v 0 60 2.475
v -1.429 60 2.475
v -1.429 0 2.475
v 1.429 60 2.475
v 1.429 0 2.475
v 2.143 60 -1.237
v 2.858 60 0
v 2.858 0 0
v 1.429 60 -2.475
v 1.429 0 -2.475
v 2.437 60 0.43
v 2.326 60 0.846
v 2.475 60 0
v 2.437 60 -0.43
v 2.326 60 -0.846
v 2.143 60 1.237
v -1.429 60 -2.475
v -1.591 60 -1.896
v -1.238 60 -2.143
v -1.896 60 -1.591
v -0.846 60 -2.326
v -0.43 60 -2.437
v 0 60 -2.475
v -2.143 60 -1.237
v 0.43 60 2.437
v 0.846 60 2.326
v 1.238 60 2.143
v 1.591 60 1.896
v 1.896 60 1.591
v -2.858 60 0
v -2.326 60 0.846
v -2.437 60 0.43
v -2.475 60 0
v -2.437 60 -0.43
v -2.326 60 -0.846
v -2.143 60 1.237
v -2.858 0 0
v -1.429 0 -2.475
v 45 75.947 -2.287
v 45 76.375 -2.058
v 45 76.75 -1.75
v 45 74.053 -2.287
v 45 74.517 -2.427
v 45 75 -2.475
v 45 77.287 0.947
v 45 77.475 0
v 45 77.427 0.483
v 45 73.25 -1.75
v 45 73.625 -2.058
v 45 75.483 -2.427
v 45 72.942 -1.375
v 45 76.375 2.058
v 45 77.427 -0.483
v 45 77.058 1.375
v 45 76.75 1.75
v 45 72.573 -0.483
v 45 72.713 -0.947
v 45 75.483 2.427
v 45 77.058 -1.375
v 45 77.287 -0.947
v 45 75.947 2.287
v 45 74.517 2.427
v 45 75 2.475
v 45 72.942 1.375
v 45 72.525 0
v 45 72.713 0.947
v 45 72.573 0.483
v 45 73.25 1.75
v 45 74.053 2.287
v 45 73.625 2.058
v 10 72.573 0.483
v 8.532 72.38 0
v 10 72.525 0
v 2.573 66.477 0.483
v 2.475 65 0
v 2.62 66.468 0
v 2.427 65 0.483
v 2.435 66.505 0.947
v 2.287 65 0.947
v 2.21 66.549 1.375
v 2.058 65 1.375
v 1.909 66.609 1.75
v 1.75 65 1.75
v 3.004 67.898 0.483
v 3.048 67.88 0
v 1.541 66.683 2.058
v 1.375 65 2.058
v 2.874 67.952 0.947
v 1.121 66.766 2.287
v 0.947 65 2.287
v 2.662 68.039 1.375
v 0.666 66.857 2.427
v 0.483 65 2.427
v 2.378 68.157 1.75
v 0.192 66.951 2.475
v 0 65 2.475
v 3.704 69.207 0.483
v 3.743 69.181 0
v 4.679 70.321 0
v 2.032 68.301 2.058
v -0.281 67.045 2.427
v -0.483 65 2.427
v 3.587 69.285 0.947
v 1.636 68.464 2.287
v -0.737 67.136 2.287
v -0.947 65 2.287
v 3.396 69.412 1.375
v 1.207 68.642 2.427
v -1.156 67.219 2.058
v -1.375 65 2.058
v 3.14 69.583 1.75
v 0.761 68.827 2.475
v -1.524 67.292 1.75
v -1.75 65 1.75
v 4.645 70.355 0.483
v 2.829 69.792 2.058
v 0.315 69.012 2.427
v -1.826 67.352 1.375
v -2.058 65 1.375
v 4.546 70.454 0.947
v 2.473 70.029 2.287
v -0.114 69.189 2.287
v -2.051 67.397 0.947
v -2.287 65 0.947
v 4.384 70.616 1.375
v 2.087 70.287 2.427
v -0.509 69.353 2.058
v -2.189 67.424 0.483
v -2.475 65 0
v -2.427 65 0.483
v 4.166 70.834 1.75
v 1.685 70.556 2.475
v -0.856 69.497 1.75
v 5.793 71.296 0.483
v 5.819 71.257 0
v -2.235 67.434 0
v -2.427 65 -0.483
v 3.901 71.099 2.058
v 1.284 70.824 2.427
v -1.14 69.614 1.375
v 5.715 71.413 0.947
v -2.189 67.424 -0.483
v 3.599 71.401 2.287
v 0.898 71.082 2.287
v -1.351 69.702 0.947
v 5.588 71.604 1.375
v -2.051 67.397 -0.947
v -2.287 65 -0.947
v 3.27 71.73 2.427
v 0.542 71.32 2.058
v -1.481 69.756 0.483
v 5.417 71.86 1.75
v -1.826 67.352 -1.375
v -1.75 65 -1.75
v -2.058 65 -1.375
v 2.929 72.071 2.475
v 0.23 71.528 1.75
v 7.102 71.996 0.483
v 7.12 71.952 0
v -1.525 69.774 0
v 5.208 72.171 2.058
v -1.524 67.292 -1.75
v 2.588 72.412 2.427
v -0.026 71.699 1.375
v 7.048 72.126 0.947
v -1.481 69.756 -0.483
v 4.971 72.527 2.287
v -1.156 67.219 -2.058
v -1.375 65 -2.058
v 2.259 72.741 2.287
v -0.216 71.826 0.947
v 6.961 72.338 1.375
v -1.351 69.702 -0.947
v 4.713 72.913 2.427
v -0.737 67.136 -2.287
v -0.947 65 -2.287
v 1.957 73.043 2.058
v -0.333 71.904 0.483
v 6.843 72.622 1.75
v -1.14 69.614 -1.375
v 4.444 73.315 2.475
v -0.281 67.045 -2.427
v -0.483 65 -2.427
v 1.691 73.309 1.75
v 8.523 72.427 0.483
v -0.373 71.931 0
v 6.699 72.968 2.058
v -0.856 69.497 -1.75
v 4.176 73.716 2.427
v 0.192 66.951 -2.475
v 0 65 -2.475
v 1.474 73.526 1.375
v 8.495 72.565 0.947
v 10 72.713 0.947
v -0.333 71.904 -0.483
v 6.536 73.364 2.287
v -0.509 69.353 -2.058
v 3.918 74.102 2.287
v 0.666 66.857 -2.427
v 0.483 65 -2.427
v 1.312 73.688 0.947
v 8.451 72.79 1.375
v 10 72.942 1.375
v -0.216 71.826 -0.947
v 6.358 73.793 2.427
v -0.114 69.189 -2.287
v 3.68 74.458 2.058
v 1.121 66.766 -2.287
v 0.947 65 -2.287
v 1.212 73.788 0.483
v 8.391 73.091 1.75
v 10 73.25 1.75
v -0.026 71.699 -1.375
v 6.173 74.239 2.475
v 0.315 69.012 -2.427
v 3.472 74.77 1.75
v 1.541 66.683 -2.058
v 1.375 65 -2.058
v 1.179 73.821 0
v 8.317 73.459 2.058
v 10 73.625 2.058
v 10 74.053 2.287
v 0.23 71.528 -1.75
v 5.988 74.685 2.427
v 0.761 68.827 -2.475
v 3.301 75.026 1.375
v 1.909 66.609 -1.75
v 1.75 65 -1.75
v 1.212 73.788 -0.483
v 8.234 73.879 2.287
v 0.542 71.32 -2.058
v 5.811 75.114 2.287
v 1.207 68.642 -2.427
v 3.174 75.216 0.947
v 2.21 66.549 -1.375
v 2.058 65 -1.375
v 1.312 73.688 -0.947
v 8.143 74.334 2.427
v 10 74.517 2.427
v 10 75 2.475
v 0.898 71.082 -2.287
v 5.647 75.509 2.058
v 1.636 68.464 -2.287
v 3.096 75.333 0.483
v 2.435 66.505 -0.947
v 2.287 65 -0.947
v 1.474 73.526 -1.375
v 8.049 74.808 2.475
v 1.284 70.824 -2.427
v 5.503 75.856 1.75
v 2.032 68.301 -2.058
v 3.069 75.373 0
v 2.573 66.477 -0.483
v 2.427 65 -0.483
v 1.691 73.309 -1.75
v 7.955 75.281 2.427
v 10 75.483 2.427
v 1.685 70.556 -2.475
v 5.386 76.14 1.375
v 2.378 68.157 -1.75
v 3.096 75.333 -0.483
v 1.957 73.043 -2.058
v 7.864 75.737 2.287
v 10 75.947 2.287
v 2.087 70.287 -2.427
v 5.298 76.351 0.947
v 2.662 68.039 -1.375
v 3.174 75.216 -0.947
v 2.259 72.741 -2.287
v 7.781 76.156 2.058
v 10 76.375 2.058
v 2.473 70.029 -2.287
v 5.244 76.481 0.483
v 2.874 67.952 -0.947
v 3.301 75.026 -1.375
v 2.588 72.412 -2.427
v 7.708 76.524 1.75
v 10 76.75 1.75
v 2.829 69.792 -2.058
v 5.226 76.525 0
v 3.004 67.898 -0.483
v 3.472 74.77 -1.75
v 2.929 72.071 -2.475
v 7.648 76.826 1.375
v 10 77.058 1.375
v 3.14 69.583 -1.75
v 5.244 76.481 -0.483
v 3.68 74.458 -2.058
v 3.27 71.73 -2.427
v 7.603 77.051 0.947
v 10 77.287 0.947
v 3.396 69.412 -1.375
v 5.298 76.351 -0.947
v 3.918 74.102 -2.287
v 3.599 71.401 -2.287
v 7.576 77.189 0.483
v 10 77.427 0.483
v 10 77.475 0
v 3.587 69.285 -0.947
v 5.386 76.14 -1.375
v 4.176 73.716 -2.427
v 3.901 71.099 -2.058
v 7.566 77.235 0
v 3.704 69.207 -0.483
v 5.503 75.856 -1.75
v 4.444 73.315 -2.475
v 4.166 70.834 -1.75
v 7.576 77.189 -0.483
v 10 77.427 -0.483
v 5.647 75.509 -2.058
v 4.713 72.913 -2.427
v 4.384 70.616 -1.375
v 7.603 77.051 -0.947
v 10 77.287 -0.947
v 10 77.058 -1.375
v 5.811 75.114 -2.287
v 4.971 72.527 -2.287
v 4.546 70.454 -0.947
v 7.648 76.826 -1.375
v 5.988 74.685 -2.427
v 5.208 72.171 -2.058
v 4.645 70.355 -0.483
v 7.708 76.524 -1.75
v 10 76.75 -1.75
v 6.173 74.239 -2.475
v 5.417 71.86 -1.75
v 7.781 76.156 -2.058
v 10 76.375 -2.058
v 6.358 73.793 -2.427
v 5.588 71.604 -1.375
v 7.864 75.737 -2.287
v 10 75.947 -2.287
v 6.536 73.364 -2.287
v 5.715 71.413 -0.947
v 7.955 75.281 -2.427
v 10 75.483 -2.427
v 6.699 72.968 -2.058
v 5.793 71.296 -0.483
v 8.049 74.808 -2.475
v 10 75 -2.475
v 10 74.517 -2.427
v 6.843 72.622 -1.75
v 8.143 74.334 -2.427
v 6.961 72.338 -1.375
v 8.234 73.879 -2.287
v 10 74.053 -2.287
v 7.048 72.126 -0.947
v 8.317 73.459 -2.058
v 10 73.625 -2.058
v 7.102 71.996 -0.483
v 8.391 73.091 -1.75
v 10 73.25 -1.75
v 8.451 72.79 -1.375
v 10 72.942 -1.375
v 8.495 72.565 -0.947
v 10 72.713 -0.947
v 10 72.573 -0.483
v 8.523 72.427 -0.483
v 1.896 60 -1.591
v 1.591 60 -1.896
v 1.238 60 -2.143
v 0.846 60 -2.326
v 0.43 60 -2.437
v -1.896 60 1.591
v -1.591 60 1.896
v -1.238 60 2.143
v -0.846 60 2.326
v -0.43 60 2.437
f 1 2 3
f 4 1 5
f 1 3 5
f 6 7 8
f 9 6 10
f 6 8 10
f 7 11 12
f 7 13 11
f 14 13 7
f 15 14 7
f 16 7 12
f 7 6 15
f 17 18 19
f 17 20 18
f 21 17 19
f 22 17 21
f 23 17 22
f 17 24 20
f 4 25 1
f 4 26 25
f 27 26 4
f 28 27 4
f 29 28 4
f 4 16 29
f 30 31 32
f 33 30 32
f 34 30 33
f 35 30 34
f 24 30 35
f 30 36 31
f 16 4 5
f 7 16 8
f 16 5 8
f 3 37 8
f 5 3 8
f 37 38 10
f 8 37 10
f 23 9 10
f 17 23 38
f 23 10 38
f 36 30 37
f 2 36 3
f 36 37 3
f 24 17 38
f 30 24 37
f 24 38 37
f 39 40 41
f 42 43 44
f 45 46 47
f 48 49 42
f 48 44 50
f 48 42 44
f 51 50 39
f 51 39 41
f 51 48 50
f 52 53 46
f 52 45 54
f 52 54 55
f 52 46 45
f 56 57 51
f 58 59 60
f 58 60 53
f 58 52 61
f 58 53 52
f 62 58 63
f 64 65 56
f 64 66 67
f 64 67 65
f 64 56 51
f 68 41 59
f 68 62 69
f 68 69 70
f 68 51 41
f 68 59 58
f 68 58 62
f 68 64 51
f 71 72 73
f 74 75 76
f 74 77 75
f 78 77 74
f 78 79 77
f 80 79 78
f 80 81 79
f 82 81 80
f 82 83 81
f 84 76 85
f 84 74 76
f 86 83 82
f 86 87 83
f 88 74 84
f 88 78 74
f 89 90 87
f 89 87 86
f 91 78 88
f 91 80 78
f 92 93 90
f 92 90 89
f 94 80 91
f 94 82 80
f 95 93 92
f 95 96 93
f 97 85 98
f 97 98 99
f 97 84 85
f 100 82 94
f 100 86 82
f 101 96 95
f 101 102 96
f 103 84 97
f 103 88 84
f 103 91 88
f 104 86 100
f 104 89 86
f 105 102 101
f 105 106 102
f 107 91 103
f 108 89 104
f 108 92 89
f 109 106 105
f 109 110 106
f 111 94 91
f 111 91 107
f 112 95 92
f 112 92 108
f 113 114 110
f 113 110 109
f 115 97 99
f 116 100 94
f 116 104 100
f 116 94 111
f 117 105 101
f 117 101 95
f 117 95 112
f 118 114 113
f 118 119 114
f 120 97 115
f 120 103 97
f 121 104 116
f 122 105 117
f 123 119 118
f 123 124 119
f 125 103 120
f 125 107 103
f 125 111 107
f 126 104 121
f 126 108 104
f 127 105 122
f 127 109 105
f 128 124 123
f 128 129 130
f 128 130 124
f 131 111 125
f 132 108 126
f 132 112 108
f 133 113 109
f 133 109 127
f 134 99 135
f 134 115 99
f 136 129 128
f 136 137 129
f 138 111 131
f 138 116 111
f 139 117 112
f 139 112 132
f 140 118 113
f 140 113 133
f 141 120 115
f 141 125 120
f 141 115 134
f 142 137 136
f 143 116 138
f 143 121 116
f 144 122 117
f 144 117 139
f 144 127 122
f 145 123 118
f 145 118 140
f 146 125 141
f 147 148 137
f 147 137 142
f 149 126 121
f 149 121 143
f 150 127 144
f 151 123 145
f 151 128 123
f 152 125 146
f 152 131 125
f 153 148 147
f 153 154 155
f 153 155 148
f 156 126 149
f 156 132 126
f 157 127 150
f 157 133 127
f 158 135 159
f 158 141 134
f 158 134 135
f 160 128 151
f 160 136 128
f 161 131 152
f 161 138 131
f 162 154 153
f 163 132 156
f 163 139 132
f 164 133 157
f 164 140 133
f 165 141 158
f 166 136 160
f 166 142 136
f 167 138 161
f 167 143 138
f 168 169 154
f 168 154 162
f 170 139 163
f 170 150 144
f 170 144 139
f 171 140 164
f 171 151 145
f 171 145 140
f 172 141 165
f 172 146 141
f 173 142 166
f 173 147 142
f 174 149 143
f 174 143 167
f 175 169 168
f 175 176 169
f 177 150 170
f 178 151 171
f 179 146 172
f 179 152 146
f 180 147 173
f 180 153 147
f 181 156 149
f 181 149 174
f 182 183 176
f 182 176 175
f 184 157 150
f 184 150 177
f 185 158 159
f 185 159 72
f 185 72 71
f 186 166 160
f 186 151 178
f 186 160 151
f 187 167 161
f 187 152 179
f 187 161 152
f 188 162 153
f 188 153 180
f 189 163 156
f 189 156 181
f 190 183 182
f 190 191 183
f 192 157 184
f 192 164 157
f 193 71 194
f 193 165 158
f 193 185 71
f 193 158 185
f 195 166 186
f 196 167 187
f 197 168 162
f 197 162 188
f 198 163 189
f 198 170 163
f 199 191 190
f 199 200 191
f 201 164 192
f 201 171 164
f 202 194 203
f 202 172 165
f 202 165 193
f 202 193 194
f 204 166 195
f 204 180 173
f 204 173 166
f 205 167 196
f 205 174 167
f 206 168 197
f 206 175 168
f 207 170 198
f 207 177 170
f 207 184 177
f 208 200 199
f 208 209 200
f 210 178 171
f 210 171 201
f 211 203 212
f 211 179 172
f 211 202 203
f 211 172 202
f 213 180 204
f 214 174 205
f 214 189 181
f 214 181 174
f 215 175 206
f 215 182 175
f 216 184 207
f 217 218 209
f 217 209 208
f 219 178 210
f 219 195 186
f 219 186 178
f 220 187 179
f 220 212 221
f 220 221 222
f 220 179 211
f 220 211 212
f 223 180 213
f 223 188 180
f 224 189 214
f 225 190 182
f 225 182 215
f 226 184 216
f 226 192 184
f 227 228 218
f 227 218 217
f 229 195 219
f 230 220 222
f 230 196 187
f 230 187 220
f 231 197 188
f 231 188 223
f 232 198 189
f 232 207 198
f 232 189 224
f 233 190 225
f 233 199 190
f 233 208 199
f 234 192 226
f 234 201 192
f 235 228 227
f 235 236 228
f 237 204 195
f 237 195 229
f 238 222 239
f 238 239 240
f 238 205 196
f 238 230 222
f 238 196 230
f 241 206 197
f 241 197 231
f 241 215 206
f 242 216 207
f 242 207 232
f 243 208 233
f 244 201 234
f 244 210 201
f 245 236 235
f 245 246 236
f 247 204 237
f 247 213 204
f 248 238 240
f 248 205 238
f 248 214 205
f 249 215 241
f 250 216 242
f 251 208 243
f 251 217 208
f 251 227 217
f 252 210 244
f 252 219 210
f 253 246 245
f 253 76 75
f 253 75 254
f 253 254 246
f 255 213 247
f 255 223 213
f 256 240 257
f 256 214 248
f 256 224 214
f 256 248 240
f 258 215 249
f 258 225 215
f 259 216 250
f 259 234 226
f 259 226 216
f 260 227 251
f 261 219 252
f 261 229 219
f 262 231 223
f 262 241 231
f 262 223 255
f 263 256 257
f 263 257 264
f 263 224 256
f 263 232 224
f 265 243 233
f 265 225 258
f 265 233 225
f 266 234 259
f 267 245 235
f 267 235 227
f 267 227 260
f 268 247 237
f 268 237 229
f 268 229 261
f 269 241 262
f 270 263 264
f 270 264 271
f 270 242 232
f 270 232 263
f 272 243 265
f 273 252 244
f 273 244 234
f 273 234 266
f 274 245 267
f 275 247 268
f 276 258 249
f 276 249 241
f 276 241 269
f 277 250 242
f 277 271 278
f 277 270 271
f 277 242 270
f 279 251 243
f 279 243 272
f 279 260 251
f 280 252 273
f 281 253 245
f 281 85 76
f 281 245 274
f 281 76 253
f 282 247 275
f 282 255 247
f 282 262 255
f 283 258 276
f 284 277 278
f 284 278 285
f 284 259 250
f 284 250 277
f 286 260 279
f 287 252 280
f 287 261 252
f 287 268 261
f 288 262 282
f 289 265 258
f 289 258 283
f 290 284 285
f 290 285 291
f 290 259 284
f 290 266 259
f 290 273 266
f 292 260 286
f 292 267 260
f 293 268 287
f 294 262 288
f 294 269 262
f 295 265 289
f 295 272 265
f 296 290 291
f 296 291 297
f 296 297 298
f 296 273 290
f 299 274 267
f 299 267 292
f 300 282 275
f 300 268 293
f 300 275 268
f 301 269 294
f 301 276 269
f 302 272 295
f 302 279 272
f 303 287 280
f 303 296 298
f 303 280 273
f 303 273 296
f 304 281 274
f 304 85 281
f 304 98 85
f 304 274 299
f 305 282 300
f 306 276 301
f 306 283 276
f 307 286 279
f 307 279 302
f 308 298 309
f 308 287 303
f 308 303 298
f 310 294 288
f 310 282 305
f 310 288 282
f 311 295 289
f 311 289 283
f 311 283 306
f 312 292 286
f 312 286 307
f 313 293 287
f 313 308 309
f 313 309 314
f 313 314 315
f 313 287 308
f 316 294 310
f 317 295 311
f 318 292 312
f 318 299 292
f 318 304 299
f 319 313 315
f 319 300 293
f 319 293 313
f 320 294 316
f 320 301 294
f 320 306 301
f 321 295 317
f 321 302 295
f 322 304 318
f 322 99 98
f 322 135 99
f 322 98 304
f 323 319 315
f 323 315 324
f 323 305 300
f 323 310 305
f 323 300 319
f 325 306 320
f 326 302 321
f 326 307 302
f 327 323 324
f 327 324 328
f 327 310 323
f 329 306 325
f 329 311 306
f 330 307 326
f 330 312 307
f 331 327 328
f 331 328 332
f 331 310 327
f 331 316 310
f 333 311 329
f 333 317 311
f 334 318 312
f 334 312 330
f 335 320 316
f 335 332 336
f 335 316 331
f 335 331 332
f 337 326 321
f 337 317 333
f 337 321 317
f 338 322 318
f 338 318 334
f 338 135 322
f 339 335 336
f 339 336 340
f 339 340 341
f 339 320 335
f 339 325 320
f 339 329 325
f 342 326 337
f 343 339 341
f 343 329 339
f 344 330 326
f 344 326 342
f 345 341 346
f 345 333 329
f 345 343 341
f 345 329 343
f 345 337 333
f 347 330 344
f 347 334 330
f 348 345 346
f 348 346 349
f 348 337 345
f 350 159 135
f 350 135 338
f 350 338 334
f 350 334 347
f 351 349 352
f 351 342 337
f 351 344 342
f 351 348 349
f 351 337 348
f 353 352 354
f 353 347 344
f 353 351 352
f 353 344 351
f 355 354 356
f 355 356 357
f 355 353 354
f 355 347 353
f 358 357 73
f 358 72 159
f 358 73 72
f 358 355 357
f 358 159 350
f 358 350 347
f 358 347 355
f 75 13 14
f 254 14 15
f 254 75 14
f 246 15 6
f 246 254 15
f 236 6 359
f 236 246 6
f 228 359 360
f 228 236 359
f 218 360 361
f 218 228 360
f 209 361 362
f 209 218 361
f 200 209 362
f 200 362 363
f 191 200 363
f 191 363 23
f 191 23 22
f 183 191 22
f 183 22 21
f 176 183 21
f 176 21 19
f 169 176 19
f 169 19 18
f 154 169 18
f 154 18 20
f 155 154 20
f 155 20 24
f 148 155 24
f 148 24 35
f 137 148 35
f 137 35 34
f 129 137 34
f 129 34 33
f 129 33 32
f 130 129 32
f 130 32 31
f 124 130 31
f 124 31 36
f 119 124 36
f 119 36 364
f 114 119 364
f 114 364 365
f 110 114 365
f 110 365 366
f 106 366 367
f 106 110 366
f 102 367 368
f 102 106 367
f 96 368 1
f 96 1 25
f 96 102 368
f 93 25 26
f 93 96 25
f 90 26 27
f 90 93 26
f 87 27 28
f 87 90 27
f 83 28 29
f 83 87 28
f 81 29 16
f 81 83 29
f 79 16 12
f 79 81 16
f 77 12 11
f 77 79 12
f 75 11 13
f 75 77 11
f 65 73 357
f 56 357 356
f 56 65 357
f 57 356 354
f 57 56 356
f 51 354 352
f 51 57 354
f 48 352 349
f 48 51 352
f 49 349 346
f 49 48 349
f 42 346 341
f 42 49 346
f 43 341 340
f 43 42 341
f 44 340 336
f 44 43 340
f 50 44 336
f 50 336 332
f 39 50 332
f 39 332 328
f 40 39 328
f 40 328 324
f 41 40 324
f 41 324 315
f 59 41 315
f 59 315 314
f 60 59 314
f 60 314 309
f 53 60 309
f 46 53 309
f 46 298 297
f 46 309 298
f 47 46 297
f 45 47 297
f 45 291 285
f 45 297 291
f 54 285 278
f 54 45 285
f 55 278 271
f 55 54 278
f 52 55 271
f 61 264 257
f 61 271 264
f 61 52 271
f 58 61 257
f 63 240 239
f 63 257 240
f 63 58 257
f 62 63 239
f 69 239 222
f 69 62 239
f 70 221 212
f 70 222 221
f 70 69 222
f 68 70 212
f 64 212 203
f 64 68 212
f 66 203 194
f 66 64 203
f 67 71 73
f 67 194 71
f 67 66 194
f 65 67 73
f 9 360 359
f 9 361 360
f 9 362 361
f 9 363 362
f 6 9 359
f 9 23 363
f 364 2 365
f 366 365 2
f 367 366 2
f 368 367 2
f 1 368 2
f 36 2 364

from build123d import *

# Parameters (mm, degrees)
SKETCH16_R          = 2.475
BOSS_EXTRUDE2_DEPTH = 60


with BuildPart() as part:
    # Sweep4: sweep along a path in Sketch15
    with BuildLine(Plane.XY) as sweep4_path:
        Line((0, 0), (0, 65))
        ThreePointArc((0, 65), (2.928932188, 72.071067812), (10, 75))
        Line((10, 75), (45, 75))
    # Sketch16 → Sweep4 (sweep)
    with BuildSketch(Plane(origin=(0, 0, 0), x_dir=(1, 0, 0), z_dir=(0, 1, 0))):
        Circle(SKETCH16_R)
    sweep(path=sweep4_path.line)

    # Sketch18 → Boss-Extrude2 (add)
    with BuildSketch(Plane(origin=(0, 0, 0), x_dir=(1, 0, 0), z_dir=(0, 1, 0))):
        Polygon((2.857883832, 0), (1.428941916, 2.475), (-1.428941916, 2.475), (-2.857883832, 0), (-1.428941916, -2.475), (1.428941916, -2.475), align=None)
    extrude(amount=BOSS_EXTRUDE2_DEPTH)


solid = part.part
